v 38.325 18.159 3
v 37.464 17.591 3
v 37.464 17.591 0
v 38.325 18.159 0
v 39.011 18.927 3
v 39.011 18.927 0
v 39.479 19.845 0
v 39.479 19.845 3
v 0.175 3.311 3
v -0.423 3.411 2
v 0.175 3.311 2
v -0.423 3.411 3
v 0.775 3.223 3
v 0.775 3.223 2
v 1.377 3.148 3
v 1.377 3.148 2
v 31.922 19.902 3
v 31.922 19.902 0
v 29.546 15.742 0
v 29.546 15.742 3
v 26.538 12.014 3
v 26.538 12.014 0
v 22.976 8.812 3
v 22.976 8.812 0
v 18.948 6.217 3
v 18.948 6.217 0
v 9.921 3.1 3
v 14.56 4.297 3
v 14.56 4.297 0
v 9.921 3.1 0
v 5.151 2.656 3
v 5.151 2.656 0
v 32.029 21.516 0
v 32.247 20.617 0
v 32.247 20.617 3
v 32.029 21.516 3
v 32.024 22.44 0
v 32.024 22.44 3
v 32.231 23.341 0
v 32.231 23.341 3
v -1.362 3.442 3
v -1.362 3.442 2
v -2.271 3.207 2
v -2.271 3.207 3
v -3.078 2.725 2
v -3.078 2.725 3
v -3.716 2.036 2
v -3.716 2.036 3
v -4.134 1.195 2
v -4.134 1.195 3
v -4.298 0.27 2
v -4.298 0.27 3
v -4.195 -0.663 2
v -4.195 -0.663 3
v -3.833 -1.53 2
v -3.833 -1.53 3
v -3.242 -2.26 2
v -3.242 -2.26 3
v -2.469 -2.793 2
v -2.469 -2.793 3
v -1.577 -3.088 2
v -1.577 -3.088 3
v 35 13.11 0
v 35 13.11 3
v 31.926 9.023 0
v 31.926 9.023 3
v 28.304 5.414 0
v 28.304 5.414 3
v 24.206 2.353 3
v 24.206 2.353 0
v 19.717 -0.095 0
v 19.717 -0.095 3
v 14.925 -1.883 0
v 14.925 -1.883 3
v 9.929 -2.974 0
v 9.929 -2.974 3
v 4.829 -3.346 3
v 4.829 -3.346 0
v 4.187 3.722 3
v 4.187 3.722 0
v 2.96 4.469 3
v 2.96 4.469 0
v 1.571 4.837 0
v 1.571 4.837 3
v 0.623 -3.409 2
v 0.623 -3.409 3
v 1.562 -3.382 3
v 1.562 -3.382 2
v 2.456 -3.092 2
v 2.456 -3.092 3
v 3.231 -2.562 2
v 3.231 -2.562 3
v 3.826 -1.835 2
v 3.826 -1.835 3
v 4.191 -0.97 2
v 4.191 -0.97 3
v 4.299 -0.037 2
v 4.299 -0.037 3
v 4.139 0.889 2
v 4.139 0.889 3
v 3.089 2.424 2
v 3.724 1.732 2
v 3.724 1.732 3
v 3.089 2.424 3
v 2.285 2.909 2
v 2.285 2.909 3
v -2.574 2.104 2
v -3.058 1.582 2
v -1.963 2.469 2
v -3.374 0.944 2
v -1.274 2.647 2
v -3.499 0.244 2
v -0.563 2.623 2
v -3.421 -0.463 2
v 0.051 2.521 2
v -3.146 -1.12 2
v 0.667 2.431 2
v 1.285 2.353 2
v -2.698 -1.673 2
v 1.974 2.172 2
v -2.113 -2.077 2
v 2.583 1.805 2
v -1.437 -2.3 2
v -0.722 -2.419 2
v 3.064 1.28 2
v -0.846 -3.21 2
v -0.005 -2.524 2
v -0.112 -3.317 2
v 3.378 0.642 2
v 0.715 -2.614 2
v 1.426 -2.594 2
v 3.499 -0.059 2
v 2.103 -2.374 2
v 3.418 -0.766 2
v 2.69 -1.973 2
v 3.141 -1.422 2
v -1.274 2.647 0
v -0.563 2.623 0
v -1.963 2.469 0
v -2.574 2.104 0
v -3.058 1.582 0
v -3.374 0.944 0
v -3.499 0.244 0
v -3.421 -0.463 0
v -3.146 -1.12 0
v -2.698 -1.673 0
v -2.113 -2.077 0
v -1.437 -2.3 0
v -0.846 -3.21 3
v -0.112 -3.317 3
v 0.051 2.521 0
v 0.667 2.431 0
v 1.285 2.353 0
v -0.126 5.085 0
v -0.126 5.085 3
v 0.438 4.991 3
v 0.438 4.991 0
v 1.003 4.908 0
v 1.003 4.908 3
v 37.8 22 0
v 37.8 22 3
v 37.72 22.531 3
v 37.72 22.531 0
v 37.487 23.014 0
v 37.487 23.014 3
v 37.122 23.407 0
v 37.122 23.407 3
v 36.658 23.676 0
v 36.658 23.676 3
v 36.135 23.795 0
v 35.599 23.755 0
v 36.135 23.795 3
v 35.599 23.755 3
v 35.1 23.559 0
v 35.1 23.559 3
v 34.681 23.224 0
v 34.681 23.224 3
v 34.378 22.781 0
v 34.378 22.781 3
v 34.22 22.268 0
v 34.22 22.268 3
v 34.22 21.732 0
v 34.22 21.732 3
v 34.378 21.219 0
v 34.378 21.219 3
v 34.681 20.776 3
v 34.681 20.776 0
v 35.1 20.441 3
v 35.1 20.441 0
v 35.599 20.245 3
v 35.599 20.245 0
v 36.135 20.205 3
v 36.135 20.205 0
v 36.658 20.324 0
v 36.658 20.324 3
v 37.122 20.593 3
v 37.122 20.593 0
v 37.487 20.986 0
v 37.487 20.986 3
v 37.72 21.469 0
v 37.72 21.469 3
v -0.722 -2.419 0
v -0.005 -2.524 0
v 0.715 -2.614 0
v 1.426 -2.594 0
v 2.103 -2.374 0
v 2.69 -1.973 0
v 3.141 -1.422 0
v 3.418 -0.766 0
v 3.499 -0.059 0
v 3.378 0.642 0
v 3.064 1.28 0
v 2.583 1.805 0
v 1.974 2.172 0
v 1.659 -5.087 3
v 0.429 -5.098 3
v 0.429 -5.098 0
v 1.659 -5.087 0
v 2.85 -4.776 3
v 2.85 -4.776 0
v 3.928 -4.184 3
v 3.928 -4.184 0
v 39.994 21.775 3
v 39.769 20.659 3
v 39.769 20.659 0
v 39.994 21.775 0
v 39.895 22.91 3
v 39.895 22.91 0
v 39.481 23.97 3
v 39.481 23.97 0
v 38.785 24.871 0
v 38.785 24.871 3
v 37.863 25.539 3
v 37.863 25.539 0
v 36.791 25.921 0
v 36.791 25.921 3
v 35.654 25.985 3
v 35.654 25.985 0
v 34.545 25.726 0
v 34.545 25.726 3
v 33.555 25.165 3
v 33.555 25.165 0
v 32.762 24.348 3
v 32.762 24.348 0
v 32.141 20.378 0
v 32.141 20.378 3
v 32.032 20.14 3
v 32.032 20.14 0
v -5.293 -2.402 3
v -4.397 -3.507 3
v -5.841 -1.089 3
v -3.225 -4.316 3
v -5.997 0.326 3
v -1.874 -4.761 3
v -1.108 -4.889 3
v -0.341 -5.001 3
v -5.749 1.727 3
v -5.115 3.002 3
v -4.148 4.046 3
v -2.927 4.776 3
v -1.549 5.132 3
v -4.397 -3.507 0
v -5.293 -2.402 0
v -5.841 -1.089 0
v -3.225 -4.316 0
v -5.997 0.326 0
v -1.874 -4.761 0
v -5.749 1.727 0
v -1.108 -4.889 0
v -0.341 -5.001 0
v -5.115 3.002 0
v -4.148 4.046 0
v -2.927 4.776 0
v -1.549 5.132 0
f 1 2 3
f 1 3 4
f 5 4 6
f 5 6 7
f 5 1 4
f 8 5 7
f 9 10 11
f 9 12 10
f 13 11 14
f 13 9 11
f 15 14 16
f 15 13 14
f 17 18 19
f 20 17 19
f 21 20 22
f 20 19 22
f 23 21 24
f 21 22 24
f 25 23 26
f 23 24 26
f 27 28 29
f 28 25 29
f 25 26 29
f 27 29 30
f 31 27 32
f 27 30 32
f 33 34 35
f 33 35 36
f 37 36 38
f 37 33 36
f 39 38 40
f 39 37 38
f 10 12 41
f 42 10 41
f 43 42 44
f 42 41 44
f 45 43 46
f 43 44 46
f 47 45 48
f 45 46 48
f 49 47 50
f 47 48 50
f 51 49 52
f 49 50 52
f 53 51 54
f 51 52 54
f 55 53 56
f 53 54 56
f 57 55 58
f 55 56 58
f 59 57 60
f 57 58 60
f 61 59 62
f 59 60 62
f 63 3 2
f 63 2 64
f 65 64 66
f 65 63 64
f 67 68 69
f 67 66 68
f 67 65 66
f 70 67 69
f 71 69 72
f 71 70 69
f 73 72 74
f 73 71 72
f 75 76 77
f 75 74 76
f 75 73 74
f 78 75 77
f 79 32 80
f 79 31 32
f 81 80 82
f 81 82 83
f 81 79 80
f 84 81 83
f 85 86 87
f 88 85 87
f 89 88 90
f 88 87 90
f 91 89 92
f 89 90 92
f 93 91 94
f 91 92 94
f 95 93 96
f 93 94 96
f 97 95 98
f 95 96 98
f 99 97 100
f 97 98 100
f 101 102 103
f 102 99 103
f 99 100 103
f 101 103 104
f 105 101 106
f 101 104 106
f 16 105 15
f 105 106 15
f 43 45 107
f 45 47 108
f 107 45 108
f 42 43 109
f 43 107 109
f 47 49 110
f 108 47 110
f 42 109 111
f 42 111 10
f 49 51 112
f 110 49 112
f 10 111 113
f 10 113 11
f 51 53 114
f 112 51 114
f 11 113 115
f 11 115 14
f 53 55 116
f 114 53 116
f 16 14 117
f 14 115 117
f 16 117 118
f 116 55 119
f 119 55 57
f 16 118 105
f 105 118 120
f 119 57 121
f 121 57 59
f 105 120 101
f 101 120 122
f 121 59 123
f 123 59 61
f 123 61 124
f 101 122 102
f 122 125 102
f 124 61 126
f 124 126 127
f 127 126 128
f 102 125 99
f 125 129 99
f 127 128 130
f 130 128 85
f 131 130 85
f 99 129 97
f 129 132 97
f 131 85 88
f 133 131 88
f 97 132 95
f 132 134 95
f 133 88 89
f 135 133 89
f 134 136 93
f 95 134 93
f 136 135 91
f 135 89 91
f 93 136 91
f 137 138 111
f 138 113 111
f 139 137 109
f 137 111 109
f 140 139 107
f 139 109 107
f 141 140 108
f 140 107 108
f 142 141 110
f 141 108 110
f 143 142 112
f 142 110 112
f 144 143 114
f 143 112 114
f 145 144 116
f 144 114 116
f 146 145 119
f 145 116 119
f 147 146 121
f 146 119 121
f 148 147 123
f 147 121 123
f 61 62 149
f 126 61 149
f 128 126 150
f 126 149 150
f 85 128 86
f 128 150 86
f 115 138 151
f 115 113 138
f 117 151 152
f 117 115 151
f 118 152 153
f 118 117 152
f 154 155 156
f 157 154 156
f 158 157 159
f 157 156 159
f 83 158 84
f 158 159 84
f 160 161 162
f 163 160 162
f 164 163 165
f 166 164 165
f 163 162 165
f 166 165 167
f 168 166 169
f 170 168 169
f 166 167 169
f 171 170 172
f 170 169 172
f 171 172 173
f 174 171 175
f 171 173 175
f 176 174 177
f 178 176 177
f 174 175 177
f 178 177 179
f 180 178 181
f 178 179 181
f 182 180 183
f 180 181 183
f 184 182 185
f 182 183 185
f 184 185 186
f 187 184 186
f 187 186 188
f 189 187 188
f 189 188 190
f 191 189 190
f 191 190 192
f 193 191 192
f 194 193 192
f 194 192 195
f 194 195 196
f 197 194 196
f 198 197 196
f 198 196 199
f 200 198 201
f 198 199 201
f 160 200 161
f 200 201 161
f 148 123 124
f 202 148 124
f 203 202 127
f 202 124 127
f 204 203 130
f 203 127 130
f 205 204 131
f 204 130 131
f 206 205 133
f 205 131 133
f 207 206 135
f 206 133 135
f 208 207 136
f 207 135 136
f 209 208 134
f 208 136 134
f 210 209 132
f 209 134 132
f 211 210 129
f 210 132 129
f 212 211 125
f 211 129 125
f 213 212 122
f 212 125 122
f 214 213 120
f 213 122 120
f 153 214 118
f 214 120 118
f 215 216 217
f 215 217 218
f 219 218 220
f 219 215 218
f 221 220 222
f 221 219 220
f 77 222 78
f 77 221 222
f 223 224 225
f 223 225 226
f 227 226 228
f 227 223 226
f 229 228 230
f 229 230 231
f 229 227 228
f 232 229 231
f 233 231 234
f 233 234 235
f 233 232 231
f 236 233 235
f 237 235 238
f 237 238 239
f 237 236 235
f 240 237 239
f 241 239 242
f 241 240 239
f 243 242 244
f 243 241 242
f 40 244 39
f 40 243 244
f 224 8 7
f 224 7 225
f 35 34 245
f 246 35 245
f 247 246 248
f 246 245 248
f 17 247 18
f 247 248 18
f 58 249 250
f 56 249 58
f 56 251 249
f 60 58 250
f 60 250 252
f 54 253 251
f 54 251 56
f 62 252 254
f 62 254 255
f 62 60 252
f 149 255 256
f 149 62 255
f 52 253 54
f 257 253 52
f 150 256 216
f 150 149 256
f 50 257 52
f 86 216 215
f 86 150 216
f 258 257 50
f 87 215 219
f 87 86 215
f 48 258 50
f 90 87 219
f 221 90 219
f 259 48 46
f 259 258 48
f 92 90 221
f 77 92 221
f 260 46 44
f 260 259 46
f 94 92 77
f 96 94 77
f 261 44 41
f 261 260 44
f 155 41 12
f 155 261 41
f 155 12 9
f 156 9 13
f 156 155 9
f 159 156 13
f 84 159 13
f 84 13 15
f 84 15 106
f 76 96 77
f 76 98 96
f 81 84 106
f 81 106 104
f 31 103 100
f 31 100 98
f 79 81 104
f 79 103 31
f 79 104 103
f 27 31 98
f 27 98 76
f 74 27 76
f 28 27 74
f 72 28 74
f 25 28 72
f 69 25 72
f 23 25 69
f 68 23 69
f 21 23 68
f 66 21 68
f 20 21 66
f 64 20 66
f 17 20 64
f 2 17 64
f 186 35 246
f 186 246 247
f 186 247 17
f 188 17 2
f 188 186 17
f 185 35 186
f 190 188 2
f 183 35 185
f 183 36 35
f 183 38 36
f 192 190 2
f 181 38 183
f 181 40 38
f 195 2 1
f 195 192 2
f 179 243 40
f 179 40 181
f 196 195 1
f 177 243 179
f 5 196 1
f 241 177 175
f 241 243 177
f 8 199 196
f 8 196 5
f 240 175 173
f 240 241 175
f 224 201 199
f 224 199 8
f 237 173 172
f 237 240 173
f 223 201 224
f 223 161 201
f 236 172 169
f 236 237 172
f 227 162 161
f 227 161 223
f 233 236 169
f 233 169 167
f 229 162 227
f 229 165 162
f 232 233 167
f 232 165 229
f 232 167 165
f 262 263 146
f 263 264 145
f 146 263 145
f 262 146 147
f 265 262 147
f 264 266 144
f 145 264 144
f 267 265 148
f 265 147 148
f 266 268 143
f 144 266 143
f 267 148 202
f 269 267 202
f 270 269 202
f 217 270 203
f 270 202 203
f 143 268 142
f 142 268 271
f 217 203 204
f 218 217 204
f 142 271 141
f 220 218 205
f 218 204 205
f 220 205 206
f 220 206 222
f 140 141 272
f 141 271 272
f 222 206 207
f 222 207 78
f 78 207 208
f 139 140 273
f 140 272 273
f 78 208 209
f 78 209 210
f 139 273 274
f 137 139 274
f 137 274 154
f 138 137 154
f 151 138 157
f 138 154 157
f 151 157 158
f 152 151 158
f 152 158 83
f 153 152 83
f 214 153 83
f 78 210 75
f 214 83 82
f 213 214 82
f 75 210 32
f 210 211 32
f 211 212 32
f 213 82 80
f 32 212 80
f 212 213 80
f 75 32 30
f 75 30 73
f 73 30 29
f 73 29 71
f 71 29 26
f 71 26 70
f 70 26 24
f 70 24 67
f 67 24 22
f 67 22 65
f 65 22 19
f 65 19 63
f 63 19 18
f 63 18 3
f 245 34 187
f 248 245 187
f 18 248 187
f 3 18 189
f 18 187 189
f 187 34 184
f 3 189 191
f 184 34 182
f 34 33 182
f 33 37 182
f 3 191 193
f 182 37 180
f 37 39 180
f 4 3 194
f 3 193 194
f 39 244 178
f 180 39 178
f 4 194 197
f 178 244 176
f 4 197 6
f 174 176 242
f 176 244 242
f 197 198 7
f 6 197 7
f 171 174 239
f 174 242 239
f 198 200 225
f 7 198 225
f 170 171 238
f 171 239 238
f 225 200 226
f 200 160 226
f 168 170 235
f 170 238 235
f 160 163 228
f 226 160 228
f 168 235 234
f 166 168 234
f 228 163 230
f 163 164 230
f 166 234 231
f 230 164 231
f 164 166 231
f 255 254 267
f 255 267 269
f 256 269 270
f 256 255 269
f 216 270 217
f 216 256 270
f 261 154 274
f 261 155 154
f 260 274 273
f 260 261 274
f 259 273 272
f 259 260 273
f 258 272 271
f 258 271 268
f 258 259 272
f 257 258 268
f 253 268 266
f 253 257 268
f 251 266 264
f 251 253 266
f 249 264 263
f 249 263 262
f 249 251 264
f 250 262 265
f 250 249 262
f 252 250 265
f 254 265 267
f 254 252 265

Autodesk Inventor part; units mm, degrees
ref_plane "YZ Plane" through (0, 0, 0) normal (1, 0, 0) x (0, 1, 0)
ref_plane "XZ Plane" through (0, 0, 0) normal (0, 1, 0) x (-1, 0, 0)
ref_plane "XY Plane" through (0, 0, 0) normal (0, 0, 1) x (1, 0, 0)
sketch "Sketch1" plane through (0, 0, 0) normal (0, 0, 1) x (1, 0, 0)
  circle A0 centre (36, 22) radius 1.25
  circle A1 centre (36, 22) radius 3
  arc A2 (0, 0) -> (36, 22) centre (4.7671, 32.6539) ccw construction
  arc A3 (-0.4334, -2.9685) -> (38.8394, 21.0315) centre (4.7671, 32.6539) ccw
  arc A4 (0.4334, 2.9685) -> (33.1606, 22.9685) centre (4.7671, 32.6539) ccw
  arc A5 (0.4334, 2.9685) -> (-0.4334, -2.9685) centre (0, 0) ccw
  arc A6 (38.8394, 21.0315) -> (33.1606, 22.9685) centre (36, 22) ccw
  point P0 (41.5332, 21.1583)
  point P1 (35.8668, 23.1312)
  point P2 (38.8394, 21.0315)
  point P3 (33.1606, 22.9685)
  dimension "d1" = 30
  dimension "d21" = 6
  dimension "d22" = 2.5
  dimension "d23" = 36
  dimension "d24" = 22
extrude "Extrusion1" add sketch "Sketch1" along normal blind 3
sketch "Sketch3" plane through (0, 0, 3) normal (0, 0, 1) x (1, 0, 0)
  arc A0 (-1, 0.1617) -> (1, -0.1304) centre (4.7671, 32.6539) ccw construction
  arc A1 (-1.8738, -4.7614) -> (0.4292, -5.0977) centre (4.7671, 32.6539) ccw
  arc A2 (-0.1262, 5.0848) -> (1.5708, 4.8369) centre (4.7671, 32.6539) ccw
  arc A3 (-0.1262, 5.0848) -> (-1.8738, -4.7614) centre (-1, 0.1617) ccw
  arc A4 (0.4292, -5.0977) -> (1.5708, 4.8369) centre (1, -0.1304) ccw
  arc A5 (-0.4334, -2.9685) -> (38.8394, 21.0315) centre (4.7671, 32.6539) ccw projected
  point P0 (0, 0)
  dimension "d31" = 10
  dimension "d32" = 1
  dimension "d33" = 1
extrude "Extrusion3" add sketch "Sketch3" against normal blind 3
sketch "Sketch4" plane through (0, 0, 3) normal (0, 0, -1) x (1, 0, 0)
  arc A0 (-1.8738, 4.7614) -> (-0.1262, -5.0848) centre (-1, -0.1617) ccw projected
  arc A1 (0.4292, 5.0977) -> (-1.8738, 4.7614) centre (4.7671, -32.6539) ccw projected
  arc A2 (1.5708, -4.8369) -> (-0.1262, -5.0848) centre (4.7671, -32.6539) ccw projected
  arc A3 (1, 0.1304) -> (-1, -0.1617) centre (4.7671, -32.6539) ccw construction
  arc A4 (0.7146, 2.6141) -> (-1.4369, 2.2998) centre (4.7671, -32.6539) ccw
  arc A5 (1.2854, -2.3532) -> (-0.5631, -2.6232) centre (4.7671, -32.6539) ccw
  arc A6 (1.2854, -2.3532) -> (0.7146, 2.6141) centre (1, 0.1304) ccw
  arc A7 (-1.4369, 2.2998) -> (-0.5631, -2.6232) centre (-1, -0.1617) ccw
  arc A8 (33.1606, -22.9685) -> (5.1514, -2.6563) centre (4.7671, -32.6539) ccw projected
  arc A9 (33.1606, -22.9685) -> (38.8394, -21.0315) centre (36, -22) ccw projected
  arc A10 (38.8394, -21.0315) -> (4.8288, 3.3461) centre (4.7671, -32.6539) ccw projected
  arc A11 (4.8288, 3.3461) -> (0.4292, 5.0977) centre (1, 0.1304) ccw projected
  arc A12 (1.5708, -4.8369) -> (5.1514, -2.6563) centre (1, 0.1304) ccw projected
  arc A13 (1.3767, -3.148) -> (-0.4233, -3.4109) centre (4.7671, -32.6539) ccw
  arc A14 (1.3767, -3.148) -> (0.6233, 3.4088) centre (1, 0.1304) ccw
  arc A15 (0.6233, 3.4088) -> (-1.5767, 3.0875) centre (4.7671, -32.6539) ccw
  arc A16 (-1.5767, 3.0875) -> (-0.4233, -3.4109) centre (-1, -0.1617) ccw
  point P0 (0, 0)
  dimension "d43" = 5
  dimension "d52" = 0.8
extrude "Extrusion4" cut sketch "Sketch4" along normal through all contours A6 A5 A7 A4
sketch "Sketch5" plane through (0, 0, 3) normal (0, 0, 1) x (1, 0, 0)
  circle A0 centre (36, 22) radius 1.25 projected
  arc A1 (0, 0) -> (36, 22) centre (4.7671, 32.6539) ccw construction
  arc A2 (39.7686, 20.6592) -> (32.2314, 23.3408) centre (36, 22) ccw
  arc A3 (31.9418, 22.5269) -> (39.479, 19.8452) centre (35.7104, 21.1861) ccw
  line L0 (35.0504, 21.4307) -> (36.2779, 20.9758)
  line L1 (37.5646, 21.4663) -> (34.5144, 22.5068)
  line L2 (31.9418, 22.5269) -> (32.2314, 23.3408)
  line L3 (39.479, 19.8452) -> (39.7686, 20.6592)
  circle A4 centre (36, 22) radius 1.8
  dimension "d44" = 8
  dimension "d46" = 1.5
  dimension "d47" = 3.6
extrude "Extrusion5" cut sketch "Sketch5" against normal up to surface (3 mm away) contours A4
extrude "Extrusion6" add sketch "Sketch5" against normal up to surface (3 mm away) contours L3 A3 L2 A2
extrude "Extrusion7" cut sketch "Sketch4" along normal blind 1 contours A13 A16 A15 A14
sketch "Sketch6" plane through (0, 0, 0) normal (0, 0, -1) x (-1, 0, 0)
  circle A0 centre (-36, 22) radius 1.8 projected
  arc A1 (-37.4644, 17.5911) -> (-4.8288, -3.3461) centre (-4.7671, 32.6539) ccw projected
  arc A2 (-4.8288, -3.3461) -> (-0.4292, -5.0977) centre (-1, -0.1304) ccw projected
  arc A3 (-0.4292, -5.0977) -> (1.8738, -4.7614) centre (-4.7671, 32.6539) ccw projected
  arc A4 (1.8738, -4.7614) -> (0.1262, 5.0848) centre (1, 0.1617) ccw projected
  arc A5 (-1.5708, 4.8369) -> (0.1262, 5.0848) centre (-4.7671, 32.6539) ccw projected
  arc A6 (-1.5708, 4.8369) -> (-5.1514, 2.6563) centre (-1, -0.1304) ccw projected
  arc A7 (-31.9221, 19.9021) -> (-5.1514, 2.6563) centre (-4.7671, 32.6539) ccw projected
  arc A8 (-31.9221, 19.9021) -> (-31.9418, 22.5269) centre (-35.7104, 21.1861) ccw projected
  line L0 (-31.9418, 22.5269) -> (-32.2314, 23.3408) projected
  arc A9 (-32.2314, 23.3408) -> (-39.7686, 20.6592) centre (-36, 22) ccw projected
  line L1 (-39.7686, 20.6592) -> (-39.479, 19.8452) projected
  arc A10 (-39.479, 19.8452) -> (-37.4644, 17.5911) centre (-35.7104, 21.1861) ccw projected
  arc A11 (-0.7146, -2.6141) -> (1.4369, -2.2998) centre (-4.7671, 32.6539) ccw projected
  arc A12 (-1.2854, 2.3532) -> (-0.7146, -2.6141) centre (-1, -0.1304) ccw projected
  arc A13 (-1.2854, 2.3532) -> (0.5631, 2.6232) centre (-4.7671, 32.6539) ccw projected
  arc A14 (1.4369, -2.2998) -> (0.5631, 2.6232) centre (1, 0.1617) ccw projected
  arc A15 (-32.2314, 23.3408) -> (-39.7686, 20.6592) centre (-36, 22) ccw projected
  arc A16 (-32.2466, 20.6173) -> (-32.2314, 23.3408) centre (-36, 22) ccw
  arc A17 (-31.9221, 19.9021) -> (-5.1514, 2.6563) centre (-4.7671, 32.6539) ccw projected
  arc A18 (-32.2466, 20.6173) -> (-31.9221, 19.9021) centre (-4.7671, 32.6539) ccw
  arc A19 (-31.9221, 19.9021) -> (-5.1514, 2.6563) centre (-4.7671, 32.6539) ccw projected
  point P0 (0, 0)
extrude "Extrusion8" cut sketch "Sketch6" against normal up to surface (3 mm away) contours L0 A8 A18 A16
